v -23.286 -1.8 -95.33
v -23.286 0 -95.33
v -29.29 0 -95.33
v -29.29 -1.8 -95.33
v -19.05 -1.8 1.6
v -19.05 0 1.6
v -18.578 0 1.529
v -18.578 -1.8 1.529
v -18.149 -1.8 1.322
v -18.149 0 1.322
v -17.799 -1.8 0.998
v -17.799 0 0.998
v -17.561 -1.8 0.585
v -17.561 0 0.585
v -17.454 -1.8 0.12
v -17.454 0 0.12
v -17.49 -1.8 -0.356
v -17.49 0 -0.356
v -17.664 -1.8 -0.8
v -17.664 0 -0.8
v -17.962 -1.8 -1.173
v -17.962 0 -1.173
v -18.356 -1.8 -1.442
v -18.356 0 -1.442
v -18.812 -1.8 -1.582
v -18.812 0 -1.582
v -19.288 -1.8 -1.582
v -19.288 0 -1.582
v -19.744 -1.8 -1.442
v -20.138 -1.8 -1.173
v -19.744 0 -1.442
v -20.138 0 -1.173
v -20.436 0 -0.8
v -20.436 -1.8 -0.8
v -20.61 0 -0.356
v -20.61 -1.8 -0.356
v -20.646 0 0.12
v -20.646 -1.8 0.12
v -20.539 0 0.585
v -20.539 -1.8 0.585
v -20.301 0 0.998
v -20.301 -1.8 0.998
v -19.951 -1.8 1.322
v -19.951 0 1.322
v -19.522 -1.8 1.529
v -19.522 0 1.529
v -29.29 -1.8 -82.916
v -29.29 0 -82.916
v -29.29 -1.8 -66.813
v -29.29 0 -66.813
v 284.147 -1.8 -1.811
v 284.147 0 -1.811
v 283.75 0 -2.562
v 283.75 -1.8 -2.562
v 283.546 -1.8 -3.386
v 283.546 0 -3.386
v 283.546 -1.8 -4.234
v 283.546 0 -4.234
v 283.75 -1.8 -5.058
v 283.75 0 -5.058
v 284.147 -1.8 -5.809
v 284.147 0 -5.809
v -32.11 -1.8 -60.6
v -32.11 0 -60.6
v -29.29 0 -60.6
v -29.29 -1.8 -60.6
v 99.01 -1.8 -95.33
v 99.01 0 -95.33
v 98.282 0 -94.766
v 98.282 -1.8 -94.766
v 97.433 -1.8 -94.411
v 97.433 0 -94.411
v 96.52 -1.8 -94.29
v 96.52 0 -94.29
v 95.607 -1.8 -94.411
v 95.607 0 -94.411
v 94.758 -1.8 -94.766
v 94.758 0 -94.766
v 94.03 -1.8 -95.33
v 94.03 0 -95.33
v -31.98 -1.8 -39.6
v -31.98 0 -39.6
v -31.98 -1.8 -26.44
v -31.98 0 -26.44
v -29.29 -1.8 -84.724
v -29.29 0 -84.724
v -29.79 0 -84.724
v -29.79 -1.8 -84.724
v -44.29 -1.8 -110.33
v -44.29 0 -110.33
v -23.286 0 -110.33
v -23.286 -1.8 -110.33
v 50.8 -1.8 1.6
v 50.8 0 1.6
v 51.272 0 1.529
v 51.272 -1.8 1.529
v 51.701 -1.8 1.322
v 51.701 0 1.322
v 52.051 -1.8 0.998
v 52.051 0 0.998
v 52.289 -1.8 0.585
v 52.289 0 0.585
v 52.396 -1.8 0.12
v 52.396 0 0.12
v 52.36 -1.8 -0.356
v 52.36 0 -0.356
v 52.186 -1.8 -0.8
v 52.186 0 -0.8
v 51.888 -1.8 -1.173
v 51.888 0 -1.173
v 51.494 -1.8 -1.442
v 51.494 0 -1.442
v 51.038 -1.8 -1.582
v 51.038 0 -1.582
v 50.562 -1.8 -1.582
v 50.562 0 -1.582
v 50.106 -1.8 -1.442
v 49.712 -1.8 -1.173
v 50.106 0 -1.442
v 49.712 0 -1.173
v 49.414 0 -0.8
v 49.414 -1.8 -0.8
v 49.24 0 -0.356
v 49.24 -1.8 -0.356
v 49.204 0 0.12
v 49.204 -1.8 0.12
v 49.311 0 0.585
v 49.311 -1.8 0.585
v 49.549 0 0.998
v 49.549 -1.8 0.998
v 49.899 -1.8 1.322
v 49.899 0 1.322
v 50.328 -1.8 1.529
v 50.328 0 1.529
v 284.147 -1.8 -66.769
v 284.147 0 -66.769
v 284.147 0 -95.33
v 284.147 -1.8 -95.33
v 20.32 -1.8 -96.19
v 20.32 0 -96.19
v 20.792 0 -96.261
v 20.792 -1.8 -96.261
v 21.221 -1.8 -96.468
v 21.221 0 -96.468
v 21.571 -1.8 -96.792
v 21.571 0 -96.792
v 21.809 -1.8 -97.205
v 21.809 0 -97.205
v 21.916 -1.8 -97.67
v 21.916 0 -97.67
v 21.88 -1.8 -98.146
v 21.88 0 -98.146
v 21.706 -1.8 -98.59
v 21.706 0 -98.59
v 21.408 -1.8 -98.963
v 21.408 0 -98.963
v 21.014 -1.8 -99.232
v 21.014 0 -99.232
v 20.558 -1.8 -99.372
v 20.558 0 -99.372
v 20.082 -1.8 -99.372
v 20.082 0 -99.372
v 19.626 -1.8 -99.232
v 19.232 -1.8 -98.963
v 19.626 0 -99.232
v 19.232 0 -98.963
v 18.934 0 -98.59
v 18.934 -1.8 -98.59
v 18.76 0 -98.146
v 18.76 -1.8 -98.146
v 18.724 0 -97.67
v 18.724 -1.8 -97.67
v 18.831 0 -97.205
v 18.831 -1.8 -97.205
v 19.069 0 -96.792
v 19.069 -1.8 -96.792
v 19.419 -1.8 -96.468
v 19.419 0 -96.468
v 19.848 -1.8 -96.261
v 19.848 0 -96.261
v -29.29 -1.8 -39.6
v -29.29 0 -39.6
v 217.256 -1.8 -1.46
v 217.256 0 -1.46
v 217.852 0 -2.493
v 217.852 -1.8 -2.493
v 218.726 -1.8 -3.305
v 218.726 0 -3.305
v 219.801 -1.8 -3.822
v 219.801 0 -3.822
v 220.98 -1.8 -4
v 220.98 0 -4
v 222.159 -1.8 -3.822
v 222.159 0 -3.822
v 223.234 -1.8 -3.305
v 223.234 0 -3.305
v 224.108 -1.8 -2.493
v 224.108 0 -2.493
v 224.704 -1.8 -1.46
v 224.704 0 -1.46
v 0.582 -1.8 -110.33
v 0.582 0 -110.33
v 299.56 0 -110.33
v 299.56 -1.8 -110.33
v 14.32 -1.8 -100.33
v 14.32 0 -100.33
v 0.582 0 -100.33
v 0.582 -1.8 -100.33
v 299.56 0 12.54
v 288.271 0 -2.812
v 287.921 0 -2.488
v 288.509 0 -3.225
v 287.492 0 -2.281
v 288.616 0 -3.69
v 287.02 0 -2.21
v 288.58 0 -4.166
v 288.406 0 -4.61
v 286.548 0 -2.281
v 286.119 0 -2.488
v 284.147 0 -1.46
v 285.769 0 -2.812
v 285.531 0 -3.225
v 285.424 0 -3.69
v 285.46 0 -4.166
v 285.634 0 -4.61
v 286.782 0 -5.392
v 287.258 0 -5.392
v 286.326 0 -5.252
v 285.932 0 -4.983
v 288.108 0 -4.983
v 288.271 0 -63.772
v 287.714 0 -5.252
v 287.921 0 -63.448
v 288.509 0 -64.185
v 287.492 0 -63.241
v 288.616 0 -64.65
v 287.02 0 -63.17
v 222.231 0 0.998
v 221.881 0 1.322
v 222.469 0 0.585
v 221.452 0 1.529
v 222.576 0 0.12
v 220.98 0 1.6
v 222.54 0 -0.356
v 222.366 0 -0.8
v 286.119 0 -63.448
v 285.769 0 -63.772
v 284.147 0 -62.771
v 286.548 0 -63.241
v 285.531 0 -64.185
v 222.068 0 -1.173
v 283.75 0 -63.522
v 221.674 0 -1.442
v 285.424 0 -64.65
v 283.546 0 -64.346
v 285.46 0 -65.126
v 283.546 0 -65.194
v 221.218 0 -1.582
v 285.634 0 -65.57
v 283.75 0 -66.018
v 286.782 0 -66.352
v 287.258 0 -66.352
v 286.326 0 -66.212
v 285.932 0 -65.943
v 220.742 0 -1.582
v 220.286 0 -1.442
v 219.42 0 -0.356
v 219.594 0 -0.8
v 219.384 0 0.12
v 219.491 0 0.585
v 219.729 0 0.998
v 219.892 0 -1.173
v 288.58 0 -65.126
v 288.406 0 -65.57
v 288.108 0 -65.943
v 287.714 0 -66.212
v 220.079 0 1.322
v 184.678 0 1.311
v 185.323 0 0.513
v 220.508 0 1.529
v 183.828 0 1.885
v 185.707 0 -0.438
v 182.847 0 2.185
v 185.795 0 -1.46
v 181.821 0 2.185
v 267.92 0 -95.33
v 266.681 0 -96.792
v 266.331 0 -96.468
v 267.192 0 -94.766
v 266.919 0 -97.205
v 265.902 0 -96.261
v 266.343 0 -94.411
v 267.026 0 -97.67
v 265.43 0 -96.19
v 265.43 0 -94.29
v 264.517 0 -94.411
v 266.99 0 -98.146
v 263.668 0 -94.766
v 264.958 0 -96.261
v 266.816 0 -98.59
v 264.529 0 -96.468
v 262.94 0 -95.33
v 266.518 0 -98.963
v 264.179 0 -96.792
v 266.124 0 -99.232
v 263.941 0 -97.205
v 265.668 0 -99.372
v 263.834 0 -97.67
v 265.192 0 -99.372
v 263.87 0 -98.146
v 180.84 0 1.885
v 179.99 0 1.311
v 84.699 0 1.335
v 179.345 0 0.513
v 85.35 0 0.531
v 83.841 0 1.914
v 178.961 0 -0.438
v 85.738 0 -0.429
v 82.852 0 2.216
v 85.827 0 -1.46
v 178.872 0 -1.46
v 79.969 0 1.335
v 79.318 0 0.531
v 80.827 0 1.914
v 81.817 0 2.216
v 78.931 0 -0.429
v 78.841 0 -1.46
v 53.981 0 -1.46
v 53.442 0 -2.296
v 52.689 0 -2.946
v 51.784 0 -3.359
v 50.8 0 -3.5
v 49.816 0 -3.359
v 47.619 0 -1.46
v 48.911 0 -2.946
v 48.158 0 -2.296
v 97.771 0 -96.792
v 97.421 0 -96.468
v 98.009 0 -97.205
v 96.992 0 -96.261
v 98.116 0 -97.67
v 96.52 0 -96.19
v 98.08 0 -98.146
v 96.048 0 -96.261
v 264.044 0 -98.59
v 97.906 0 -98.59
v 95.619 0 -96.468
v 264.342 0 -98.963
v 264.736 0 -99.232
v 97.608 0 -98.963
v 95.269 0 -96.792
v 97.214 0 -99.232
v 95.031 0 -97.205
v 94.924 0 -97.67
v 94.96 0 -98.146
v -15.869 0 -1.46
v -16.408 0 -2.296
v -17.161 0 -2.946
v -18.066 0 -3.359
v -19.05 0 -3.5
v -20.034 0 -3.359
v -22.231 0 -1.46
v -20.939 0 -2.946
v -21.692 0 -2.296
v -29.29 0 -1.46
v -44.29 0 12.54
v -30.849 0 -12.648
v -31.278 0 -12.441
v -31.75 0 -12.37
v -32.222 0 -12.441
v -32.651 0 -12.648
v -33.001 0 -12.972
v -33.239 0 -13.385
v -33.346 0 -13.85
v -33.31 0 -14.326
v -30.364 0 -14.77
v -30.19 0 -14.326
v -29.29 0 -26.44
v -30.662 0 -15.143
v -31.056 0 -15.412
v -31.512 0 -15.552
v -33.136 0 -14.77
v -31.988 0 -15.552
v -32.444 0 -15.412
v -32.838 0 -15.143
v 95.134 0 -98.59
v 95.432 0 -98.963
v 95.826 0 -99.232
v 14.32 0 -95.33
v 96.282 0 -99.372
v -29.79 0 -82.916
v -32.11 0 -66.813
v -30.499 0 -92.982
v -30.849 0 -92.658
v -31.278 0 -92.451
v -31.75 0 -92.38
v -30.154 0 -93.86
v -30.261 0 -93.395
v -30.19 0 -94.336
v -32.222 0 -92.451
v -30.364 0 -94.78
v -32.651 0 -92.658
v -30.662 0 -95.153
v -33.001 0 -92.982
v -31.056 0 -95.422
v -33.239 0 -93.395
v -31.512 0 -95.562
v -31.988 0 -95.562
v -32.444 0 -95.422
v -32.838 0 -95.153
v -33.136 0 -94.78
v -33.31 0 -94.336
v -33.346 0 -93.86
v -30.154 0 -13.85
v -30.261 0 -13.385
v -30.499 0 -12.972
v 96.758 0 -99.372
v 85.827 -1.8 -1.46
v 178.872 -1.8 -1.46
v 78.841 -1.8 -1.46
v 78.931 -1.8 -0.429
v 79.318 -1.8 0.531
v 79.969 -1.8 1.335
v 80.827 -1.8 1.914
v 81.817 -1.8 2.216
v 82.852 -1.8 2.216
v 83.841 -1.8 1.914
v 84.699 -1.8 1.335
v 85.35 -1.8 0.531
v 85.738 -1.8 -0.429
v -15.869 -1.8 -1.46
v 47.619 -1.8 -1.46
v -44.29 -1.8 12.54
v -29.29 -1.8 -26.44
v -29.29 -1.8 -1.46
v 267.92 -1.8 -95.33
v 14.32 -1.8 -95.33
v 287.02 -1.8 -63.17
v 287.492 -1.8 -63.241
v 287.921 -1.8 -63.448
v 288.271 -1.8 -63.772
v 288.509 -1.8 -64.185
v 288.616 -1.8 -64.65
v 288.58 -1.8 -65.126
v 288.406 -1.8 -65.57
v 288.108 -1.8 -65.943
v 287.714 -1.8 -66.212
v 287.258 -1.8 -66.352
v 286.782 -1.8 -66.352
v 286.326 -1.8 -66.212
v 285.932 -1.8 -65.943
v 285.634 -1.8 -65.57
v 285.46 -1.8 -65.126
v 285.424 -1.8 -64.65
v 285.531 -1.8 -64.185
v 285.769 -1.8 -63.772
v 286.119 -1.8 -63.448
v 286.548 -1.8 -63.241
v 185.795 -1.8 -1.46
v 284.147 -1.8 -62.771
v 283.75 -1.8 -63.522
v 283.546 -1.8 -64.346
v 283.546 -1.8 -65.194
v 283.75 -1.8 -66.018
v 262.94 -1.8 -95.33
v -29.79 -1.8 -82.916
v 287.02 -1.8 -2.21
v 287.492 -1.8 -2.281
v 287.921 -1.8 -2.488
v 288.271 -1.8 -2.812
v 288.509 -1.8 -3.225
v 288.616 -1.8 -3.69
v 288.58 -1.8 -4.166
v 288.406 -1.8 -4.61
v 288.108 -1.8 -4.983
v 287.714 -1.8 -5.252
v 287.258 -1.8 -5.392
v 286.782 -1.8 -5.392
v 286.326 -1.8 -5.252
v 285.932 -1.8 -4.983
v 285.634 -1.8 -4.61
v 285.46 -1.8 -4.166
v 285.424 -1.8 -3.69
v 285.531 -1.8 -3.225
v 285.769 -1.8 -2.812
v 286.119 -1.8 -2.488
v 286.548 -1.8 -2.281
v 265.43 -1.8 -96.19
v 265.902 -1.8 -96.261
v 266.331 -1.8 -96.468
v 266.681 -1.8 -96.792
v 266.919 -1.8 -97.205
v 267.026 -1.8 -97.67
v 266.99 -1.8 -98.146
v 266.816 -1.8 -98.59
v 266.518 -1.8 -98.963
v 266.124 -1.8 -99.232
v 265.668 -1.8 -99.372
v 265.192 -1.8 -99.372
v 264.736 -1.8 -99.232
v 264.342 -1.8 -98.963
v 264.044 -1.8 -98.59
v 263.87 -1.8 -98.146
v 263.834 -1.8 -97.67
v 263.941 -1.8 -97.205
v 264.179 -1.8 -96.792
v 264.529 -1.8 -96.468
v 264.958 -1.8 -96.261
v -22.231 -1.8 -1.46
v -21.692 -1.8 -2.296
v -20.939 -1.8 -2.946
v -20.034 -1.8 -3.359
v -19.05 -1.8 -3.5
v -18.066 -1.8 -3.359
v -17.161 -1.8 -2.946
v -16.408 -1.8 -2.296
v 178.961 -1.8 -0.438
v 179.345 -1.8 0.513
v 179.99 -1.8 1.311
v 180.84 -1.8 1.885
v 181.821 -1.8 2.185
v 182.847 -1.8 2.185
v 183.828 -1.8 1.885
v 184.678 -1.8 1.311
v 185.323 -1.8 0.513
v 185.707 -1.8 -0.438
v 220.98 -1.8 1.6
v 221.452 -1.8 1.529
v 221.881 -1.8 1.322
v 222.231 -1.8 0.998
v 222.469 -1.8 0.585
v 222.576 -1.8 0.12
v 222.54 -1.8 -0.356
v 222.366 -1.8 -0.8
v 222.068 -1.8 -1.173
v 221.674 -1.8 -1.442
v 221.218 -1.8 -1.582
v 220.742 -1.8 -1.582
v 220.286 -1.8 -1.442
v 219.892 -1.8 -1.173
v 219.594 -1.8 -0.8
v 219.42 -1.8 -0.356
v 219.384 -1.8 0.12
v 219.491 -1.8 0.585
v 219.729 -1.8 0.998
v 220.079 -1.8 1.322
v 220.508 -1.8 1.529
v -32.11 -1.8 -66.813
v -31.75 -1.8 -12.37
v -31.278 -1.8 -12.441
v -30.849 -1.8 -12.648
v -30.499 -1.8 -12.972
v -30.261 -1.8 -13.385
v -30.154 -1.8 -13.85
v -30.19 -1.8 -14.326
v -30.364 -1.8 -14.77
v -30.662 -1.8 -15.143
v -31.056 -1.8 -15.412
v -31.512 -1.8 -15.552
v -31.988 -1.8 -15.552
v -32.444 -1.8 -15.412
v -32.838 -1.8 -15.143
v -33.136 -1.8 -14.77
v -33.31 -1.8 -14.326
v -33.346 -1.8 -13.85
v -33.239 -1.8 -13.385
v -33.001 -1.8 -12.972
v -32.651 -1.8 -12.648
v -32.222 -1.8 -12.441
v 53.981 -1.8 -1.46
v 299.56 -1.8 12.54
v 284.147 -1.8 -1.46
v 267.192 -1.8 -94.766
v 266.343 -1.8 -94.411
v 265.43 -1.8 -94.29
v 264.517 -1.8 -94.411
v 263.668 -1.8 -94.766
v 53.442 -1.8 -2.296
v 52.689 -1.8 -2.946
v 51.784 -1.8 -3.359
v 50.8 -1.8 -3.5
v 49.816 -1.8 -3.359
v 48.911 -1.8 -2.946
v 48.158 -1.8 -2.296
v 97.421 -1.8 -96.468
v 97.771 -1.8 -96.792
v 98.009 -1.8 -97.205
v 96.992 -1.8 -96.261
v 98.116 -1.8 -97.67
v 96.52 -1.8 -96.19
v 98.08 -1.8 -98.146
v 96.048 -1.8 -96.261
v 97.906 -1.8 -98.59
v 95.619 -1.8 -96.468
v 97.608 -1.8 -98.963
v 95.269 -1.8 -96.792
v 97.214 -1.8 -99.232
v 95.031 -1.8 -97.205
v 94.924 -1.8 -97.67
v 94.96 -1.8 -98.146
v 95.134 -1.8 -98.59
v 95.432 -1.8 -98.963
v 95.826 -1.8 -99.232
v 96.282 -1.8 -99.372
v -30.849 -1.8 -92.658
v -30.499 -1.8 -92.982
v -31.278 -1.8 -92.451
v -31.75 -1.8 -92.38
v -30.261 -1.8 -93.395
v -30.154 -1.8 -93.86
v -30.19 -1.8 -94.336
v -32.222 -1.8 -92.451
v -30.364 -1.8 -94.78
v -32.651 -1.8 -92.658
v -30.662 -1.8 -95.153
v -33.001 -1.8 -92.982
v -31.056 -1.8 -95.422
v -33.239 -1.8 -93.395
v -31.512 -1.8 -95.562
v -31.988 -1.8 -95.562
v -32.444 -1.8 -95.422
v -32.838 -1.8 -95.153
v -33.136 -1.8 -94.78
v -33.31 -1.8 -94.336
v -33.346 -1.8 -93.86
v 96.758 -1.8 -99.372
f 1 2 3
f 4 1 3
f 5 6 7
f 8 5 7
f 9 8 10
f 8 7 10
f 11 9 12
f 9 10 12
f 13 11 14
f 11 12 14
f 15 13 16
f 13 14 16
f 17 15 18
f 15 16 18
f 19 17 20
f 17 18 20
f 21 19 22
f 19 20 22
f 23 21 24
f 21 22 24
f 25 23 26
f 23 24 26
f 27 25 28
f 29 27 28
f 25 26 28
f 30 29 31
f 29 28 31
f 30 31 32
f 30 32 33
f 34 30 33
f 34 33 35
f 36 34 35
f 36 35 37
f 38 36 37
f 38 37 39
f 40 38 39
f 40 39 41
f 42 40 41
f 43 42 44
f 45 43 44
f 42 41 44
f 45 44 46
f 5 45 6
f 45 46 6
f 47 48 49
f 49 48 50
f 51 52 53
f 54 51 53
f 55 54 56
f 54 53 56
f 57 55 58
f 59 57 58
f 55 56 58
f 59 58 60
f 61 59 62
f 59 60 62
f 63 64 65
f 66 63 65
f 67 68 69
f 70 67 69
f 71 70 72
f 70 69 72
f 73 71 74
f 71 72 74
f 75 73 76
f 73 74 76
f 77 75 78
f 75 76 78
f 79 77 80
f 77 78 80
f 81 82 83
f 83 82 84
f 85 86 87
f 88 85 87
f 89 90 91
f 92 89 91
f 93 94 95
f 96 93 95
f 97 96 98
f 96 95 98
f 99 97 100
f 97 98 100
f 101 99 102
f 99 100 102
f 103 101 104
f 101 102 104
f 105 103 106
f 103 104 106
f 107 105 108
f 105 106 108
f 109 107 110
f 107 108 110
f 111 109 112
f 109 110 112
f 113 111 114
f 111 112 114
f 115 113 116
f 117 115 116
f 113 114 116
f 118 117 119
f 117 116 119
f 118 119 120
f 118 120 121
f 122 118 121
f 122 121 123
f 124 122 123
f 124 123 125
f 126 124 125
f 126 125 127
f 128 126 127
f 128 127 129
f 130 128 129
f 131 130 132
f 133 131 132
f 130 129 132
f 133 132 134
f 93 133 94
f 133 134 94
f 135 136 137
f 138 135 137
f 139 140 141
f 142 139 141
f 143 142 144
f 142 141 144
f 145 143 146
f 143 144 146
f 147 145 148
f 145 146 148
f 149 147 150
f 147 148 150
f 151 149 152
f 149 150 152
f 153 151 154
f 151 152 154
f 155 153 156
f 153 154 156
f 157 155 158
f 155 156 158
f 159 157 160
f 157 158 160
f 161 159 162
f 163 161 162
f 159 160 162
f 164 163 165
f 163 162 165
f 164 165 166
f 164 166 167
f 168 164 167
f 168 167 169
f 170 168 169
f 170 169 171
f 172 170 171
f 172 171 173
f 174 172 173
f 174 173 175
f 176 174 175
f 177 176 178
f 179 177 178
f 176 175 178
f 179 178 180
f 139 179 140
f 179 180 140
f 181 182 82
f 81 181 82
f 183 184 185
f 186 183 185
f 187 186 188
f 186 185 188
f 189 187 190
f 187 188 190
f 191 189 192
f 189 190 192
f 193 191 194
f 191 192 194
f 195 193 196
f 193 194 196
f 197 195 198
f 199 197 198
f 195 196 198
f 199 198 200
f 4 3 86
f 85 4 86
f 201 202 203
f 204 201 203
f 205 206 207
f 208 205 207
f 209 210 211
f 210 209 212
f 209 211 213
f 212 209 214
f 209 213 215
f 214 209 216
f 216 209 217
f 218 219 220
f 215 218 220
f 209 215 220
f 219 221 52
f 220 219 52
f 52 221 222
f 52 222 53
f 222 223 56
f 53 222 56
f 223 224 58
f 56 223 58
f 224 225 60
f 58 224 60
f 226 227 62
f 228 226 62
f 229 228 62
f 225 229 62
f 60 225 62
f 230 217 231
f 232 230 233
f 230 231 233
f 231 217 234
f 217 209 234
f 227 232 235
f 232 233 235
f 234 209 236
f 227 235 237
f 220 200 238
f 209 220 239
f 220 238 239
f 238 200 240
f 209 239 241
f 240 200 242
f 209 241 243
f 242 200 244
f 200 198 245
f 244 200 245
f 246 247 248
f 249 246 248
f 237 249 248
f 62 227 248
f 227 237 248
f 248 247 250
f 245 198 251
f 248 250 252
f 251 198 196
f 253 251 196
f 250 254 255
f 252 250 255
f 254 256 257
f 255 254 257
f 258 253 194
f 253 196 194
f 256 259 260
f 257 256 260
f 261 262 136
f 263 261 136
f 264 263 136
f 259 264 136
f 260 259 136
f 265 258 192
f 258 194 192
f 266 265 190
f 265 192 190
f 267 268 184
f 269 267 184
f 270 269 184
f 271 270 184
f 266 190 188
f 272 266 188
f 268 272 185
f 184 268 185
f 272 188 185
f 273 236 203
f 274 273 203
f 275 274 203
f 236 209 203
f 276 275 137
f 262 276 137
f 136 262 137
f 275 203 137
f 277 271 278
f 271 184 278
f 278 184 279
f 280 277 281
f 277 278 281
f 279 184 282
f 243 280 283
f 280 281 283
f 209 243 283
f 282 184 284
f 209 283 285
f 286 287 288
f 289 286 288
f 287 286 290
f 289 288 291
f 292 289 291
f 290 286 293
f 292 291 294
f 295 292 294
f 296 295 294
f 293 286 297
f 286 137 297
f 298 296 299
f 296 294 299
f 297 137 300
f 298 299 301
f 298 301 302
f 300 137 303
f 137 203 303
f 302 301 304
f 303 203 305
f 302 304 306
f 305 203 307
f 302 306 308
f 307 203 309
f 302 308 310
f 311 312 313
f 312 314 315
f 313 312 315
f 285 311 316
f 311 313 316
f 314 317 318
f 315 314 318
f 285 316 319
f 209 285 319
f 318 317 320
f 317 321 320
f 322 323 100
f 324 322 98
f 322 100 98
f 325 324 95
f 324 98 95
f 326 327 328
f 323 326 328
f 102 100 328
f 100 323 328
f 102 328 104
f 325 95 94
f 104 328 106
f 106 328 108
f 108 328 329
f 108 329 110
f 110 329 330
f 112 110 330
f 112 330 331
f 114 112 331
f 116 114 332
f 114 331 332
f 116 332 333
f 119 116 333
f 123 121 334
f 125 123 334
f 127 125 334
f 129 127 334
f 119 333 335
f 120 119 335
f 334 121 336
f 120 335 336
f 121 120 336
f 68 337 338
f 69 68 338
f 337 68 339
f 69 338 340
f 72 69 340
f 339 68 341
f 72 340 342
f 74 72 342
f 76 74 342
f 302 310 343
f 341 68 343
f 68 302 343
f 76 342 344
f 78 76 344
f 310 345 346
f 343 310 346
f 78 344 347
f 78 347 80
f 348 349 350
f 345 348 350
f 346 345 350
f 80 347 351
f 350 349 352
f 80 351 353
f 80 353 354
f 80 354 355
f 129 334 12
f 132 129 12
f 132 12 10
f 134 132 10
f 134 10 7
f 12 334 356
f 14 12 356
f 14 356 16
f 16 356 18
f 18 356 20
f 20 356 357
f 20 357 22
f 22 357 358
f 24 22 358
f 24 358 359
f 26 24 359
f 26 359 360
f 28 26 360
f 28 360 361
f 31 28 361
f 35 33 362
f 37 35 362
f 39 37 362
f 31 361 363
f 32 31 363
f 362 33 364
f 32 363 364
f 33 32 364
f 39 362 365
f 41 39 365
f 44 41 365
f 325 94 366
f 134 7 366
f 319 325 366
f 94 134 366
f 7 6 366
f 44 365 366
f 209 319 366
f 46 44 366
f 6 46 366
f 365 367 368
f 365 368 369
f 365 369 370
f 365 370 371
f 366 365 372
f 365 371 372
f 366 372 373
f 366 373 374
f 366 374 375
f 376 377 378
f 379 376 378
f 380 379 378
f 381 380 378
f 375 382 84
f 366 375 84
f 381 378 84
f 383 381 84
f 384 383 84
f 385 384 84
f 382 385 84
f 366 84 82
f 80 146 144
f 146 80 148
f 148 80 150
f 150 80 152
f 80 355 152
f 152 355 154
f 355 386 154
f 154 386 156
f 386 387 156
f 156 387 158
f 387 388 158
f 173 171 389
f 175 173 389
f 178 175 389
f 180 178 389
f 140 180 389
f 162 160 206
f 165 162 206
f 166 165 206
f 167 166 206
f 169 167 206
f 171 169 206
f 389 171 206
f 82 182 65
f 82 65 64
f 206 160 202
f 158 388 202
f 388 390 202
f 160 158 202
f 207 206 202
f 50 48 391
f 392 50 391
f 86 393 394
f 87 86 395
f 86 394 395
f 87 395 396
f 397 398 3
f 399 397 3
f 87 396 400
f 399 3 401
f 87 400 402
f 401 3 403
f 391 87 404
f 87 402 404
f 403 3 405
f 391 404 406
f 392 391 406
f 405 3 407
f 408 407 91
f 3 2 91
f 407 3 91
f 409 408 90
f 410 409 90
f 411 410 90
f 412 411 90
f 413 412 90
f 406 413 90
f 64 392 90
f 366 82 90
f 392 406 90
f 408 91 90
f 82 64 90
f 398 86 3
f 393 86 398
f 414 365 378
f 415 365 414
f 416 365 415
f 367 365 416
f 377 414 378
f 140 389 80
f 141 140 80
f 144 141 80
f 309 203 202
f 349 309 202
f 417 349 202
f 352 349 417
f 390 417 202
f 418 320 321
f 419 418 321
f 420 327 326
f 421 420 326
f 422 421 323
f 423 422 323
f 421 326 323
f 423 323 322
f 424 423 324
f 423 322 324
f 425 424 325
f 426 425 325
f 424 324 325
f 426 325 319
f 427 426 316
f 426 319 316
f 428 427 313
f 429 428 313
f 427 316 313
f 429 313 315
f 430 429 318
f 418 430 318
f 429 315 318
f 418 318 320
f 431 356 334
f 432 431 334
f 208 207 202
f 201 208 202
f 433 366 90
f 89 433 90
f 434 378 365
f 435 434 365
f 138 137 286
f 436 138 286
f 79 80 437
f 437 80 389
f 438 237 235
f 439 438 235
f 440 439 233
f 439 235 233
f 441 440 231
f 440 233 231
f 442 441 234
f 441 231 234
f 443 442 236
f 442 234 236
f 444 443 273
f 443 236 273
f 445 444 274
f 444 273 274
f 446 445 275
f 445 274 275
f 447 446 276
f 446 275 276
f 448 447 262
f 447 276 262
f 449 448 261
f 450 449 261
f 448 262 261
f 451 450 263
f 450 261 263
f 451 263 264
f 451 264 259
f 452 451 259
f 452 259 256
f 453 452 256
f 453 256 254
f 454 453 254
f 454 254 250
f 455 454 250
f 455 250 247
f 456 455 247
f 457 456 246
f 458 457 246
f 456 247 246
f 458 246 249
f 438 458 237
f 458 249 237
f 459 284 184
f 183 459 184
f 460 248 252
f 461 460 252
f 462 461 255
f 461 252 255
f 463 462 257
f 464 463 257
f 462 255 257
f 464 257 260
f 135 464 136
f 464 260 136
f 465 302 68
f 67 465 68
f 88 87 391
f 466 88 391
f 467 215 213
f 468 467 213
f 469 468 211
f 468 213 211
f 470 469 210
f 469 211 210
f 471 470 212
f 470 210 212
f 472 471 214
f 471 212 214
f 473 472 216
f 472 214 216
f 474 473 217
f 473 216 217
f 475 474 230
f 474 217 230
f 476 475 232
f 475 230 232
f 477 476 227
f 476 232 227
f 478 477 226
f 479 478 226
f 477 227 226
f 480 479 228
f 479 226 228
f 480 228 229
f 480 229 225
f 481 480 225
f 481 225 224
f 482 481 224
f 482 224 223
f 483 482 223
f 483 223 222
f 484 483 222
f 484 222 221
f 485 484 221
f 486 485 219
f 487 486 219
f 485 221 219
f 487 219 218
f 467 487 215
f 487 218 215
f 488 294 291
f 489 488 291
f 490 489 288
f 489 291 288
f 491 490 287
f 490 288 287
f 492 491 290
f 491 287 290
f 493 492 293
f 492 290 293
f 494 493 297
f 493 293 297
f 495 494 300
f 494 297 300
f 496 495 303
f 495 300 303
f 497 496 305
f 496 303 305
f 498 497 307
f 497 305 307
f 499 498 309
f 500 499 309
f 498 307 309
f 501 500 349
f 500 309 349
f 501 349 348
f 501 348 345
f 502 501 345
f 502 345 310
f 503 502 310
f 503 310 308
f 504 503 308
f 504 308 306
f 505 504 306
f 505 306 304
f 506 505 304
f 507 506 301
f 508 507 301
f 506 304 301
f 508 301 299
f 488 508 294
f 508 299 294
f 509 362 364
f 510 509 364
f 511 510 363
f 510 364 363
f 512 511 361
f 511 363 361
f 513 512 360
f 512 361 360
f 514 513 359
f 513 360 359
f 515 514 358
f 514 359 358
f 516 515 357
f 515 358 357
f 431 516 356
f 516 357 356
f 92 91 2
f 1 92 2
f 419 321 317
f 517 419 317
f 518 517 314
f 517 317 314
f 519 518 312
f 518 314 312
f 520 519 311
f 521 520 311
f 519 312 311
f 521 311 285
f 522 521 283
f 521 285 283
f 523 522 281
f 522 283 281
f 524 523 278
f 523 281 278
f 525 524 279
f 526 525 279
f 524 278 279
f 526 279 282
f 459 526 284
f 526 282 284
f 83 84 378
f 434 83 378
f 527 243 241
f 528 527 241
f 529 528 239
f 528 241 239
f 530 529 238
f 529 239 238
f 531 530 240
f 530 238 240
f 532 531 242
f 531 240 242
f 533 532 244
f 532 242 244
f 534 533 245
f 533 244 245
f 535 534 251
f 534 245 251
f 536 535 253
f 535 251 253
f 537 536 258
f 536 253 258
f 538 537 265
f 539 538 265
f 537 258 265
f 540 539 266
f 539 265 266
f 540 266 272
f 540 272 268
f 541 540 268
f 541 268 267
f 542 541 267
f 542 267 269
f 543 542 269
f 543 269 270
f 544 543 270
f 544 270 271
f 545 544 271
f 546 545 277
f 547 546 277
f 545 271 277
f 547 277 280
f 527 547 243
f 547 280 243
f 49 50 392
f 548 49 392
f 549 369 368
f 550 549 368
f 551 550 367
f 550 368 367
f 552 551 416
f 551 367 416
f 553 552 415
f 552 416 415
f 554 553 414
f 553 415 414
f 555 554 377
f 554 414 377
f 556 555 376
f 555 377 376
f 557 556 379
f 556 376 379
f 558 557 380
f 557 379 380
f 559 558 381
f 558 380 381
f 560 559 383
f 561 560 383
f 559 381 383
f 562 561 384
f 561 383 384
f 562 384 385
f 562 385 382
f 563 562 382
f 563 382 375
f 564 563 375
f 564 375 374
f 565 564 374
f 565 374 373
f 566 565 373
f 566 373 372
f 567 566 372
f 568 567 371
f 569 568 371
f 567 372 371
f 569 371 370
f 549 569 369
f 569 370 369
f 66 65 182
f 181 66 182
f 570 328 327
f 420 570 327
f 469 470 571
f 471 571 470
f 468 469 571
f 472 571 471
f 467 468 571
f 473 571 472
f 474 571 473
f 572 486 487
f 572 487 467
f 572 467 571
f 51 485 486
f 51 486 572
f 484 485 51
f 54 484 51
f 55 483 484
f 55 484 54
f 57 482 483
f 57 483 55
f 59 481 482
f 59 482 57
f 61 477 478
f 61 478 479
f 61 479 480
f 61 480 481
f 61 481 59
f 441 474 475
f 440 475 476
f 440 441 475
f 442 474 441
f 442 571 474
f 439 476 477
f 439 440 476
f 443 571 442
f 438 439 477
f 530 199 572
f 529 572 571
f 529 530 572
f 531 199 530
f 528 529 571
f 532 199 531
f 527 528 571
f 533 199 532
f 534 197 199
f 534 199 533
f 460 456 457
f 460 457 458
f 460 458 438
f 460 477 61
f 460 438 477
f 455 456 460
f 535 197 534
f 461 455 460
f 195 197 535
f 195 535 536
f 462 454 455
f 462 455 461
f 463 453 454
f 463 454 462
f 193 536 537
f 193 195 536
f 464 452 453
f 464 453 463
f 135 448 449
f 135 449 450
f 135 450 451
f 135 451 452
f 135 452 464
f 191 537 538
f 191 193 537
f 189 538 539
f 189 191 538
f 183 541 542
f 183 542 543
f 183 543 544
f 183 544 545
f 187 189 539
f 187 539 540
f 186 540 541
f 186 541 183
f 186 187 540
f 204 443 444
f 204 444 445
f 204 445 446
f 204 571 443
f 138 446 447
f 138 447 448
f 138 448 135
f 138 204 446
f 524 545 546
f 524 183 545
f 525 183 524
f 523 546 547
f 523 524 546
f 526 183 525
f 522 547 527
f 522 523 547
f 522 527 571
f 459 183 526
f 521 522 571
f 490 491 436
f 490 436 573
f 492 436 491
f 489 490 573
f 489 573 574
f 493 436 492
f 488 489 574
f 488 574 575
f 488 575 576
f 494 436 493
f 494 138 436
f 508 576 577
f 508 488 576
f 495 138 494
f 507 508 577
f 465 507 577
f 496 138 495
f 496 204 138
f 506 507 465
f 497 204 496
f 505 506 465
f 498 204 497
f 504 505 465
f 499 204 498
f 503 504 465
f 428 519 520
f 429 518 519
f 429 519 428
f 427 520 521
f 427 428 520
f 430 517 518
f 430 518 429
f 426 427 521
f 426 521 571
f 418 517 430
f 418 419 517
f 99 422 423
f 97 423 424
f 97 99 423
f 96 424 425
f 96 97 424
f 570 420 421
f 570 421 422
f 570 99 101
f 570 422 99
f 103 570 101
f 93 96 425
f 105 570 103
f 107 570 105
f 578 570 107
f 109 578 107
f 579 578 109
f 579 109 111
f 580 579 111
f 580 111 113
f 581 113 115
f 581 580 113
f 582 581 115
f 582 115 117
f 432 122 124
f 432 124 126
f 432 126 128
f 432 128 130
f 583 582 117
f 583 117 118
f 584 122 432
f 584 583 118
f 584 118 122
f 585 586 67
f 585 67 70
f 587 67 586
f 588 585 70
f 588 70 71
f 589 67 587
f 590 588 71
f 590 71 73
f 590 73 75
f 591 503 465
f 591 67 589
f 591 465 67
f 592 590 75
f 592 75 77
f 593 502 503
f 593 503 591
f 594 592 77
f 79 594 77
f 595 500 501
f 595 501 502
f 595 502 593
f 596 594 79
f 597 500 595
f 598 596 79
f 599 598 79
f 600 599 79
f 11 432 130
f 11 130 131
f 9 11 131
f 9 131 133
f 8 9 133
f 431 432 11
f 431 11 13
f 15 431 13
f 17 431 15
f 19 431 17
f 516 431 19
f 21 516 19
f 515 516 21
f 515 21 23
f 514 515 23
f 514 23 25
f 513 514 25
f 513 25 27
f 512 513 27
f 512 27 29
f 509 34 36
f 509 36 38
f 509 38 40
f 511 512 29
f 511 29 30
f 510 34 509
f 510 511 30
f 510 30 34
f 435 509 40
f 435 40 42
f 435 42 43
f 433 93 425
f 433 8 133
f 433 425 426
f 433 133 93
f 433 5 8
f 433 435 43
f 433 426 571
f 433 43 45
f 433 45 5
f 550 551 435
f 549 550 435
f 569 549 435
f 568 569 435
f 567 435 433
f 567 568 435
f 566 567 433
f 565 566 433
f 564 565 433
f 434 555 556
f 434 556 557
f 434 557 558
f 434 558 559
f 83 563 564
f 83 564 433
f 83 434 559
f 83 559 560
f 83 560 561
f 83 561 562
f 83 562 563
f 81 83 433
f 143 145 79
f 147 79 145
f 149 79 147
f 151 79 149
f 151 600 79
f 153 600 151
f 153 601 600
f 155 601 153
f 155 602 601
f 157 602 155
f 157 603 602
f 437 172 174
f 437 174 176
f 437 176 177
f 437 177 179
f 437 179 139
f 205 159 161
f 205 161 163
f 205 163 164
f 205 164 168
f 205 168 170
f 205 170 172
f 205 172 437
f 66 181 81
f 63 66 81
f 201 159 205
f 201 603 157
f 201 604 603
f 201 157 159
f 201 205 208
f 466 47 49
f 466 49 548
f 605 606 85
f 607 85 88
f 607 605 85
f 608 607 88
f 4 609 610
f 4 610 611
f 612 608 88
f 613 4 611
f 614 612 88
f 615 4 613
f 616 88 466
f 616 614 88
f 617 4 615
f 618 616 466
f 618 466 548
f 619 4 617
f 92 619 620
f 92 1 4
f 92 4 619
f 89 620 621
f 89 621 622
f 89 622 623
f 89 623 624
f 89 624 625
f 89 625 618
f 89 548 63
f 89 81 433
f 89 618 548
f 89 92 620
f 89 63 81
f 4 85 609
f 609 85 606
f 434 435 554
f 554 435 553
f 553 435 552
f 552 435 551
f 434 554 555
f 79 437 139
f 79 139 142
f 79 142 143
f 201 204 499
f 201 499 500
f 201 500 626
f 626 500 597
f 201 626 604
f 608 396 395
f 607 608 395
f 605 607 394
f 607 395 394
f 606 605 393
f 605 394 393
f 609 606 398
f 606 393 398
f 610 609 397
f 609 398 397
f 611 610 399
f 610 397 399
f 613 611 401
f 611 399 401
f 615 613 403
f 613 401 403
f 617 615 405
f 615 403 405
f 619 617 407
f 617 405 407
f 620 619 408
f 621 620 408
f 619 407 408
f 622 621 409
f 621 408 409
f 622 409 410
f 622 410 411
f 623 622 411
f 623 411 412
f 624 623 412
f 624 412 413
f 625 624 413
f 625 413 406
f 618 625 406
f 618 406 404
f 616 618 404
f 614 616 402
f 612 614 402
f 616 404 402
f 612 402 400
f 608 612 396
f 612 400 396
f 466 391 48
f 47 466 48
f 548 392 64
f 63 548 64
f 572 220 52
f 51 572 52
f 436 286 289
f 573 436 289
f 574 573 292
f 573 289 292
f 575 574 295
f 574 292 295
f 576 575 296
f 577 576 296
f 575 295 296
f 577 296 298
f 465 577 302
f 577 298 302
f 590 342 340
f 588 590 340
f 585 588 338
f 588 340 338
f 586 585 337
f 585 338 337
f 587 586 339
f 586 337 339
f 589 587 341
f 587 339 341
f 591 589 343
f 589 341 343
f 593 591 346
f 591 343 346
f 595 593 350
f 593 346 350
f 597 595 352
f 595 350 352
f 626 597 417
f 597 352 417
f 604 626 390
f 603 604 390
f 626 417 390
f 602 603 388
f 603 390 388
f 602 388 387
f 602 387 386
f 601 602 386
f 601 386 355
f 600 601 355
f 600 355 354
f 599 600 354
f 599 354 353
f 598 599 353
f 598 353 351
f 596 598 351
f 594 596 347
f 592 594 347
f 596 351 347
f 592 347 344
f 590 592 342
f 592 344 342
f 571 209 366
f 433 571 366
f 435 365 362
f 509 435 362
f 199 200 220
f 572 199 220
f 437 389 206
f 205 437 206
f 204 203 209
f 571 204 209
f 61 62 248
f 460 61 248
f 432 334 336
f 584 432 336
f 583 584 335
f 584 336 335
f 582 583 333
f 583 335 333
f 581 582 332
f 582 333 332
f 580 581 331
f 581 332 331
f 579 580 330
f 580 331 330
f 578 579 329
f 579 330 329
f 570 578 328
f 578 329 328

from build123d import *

# Parameters (mm, degrees)
SKETCH_3_R      = 1.6
EXTRUDE_1_DEPTH = 1.8


with BuildPart() as part:
    # 草图3 → 凸台-拉伸1 (new body)
    with BuildSketch(Plane(origin=(0, 0, 0), x_dir=(1, 0, 0), z_dir=(0, 1, 0))):
        with BuildLine():
            Line((-44.29, 110.33), (-23.2864152, 110.33))
            Line((-23.2864152, 110.33), (-23.2864152, 95.33))
            Line((-23.2864152, 95.33), (-29.29, 95.33))
            Line((-29.29, 95.33), (-29.29, 84.723605))
            Line((-29.29, 84.723605), (-29.79, 84.723605))
            Line((-29.79, 84.723605), (-29.79, 82.916395))
            Line((-29.79, 82.916395), (-29.29, 82.916395))
            Line((-29.29, 82.916395), (-29.29, 66.81327125))
            Line((-29.29, 66.81327125), (-32.110172, 66.81327125))
            Line((-32.110172, 66.81327125), (-32.110172, 60.6000312))
            Line((-32.110172, 60.6000312), (-29.29, 60.6000312))
            Line((-29.29, 60.6000312), (-29.29, 39.6))
            Line((-29.29, 39.6), (-31.98, 39.6))
            Line((-31.98, 39.6), (-31.98, 26.44))
            Line((-31.98, 26.44), (-29.29, 26.44))
            Line((-29.29, 26.44), (-29.29, 1.46))
            Line((-29.29, 1.46), (-22.230943256, 1.46))
            ThreePointArc((-22.230943256, 1.46), (-19.05, 3.5), (-15.869056744, 1.46))
            Line((-15.869056744, 1.46), (47.619040111, 1.46))
            ThreePointArc((47.619040111, 1.46), (50.7999886, 3.5000114), (53.980937089, 1.46))
            Line((53.980937089, 1.46), (78.840703168, 1.46))
            ThreePointArc((78.840703168, 1.46), (82.3341, -2.254892), (85.827496832, 1.46))
            Line((85.827496832, 1.46), (178.872422541, 1.46))
            ThreePointArc((178.872422541, 1.46), (182.3339, -2.2230334), (185.795377459, 1.46))
            Line((185.795377459, 1.46), (217.255954056, 1.46))
            ThreePointArc((217.255954056, 1.46), (220.9799886, 4.0000114), (224.704023144, 1.46))
            Line((224.704023144, 1.46), (284.147, 1.46))
            Line((284.147, 1.46), (284.147, 1.811027532))
            ThreePointArc((284.147, 1.811027532), (283.5199886, 3.8100114), (284.147, 5.808995268))
            Line((284.147, 5.808995268), (284.147, 62.771027532))
            ThreePointArc((284.147, 62.771027532), (283.5199886, 64.7700114), (284.147, 66.768995268))
            Line((284.147, 66.768995268), (284.147, 95.33))
            Line((284.147, 95.33), (267.919635947, 95.33))
            ThreePointArc((267.919635947, 95.33), (265.4299886, 94.2900114), (262.940341253, 95.33))
            Line((262.940341253, 95.33), (99.009635947, 95.33))
            ThreePointArc((99.009635947, 95.33), (96.5199886, 94.2900114), (94.030341253, 95.33))
            Line((94.030341253, 95.33), (14.32, 95.33))
            Line((14.32, 95.33), (14.32, 100.33))
            Line((14.32, 100.33), (0.5819962, 100.33))
            Line((0.5819962, 100.33), (0.5819962, 110.33))
            Line((0.5819962, 110.33), (299.56, 110.33))
            Line((299.56, 110.33), (299.56, -12.54))
            Line((299.56, -12.54), (-44.29, -12.54))
            Line((-44.29, -12.54), (-44.29, 110.33))
        make_face()
        with Locations((-31.75, 93.98)):
            Circle(SKETCH_3_R, mode=Mode.SUBTRACT)
        with Locations((20.32, 97.79)):
            Circle(SKETCH_3_R, mode=Mode.SUBTRACT)
        with Locations((96.5199886, 97.7900114)):
            Circle(SKETCH_3_R, mode=Mode.SUBTRACT)
        with Locations((265.4299886, 97.7900114)):
            Circle(SKETCH_3_R, mode=Mode.SUBTRACT)
        with Locations((287.0199886, 64.7700114)):
            Circle(SKETCH_3_R, mode=Mode.SUBTRACT)
        with Locations((287.0199886, 3.8100114)):
            Circle(SKETCH_3_R, mode=Mode.SUBTRACT)
        with Locations((220.9799886, 1.14e-05)):
            Circle(SKETCH_3_R, mode=Mode.SUBTRACT)
        with Locations((50.7999886, 1.14e-05)):
            Circle(SKETCH_3_R, mode=Mode.SUBTRACT)
        with Locations((-19.05, 0)):
            Circle(SKETCH_3_R, mode=Mode.SUBTRACT)
        with Locations((-31.75, 13.97)):
            Circle(SKETCH_3_R, mode=Mode.SUBTRACT)
    extrude(amount=-EXTRUDE_1_DEPTH)


solid = part.part
